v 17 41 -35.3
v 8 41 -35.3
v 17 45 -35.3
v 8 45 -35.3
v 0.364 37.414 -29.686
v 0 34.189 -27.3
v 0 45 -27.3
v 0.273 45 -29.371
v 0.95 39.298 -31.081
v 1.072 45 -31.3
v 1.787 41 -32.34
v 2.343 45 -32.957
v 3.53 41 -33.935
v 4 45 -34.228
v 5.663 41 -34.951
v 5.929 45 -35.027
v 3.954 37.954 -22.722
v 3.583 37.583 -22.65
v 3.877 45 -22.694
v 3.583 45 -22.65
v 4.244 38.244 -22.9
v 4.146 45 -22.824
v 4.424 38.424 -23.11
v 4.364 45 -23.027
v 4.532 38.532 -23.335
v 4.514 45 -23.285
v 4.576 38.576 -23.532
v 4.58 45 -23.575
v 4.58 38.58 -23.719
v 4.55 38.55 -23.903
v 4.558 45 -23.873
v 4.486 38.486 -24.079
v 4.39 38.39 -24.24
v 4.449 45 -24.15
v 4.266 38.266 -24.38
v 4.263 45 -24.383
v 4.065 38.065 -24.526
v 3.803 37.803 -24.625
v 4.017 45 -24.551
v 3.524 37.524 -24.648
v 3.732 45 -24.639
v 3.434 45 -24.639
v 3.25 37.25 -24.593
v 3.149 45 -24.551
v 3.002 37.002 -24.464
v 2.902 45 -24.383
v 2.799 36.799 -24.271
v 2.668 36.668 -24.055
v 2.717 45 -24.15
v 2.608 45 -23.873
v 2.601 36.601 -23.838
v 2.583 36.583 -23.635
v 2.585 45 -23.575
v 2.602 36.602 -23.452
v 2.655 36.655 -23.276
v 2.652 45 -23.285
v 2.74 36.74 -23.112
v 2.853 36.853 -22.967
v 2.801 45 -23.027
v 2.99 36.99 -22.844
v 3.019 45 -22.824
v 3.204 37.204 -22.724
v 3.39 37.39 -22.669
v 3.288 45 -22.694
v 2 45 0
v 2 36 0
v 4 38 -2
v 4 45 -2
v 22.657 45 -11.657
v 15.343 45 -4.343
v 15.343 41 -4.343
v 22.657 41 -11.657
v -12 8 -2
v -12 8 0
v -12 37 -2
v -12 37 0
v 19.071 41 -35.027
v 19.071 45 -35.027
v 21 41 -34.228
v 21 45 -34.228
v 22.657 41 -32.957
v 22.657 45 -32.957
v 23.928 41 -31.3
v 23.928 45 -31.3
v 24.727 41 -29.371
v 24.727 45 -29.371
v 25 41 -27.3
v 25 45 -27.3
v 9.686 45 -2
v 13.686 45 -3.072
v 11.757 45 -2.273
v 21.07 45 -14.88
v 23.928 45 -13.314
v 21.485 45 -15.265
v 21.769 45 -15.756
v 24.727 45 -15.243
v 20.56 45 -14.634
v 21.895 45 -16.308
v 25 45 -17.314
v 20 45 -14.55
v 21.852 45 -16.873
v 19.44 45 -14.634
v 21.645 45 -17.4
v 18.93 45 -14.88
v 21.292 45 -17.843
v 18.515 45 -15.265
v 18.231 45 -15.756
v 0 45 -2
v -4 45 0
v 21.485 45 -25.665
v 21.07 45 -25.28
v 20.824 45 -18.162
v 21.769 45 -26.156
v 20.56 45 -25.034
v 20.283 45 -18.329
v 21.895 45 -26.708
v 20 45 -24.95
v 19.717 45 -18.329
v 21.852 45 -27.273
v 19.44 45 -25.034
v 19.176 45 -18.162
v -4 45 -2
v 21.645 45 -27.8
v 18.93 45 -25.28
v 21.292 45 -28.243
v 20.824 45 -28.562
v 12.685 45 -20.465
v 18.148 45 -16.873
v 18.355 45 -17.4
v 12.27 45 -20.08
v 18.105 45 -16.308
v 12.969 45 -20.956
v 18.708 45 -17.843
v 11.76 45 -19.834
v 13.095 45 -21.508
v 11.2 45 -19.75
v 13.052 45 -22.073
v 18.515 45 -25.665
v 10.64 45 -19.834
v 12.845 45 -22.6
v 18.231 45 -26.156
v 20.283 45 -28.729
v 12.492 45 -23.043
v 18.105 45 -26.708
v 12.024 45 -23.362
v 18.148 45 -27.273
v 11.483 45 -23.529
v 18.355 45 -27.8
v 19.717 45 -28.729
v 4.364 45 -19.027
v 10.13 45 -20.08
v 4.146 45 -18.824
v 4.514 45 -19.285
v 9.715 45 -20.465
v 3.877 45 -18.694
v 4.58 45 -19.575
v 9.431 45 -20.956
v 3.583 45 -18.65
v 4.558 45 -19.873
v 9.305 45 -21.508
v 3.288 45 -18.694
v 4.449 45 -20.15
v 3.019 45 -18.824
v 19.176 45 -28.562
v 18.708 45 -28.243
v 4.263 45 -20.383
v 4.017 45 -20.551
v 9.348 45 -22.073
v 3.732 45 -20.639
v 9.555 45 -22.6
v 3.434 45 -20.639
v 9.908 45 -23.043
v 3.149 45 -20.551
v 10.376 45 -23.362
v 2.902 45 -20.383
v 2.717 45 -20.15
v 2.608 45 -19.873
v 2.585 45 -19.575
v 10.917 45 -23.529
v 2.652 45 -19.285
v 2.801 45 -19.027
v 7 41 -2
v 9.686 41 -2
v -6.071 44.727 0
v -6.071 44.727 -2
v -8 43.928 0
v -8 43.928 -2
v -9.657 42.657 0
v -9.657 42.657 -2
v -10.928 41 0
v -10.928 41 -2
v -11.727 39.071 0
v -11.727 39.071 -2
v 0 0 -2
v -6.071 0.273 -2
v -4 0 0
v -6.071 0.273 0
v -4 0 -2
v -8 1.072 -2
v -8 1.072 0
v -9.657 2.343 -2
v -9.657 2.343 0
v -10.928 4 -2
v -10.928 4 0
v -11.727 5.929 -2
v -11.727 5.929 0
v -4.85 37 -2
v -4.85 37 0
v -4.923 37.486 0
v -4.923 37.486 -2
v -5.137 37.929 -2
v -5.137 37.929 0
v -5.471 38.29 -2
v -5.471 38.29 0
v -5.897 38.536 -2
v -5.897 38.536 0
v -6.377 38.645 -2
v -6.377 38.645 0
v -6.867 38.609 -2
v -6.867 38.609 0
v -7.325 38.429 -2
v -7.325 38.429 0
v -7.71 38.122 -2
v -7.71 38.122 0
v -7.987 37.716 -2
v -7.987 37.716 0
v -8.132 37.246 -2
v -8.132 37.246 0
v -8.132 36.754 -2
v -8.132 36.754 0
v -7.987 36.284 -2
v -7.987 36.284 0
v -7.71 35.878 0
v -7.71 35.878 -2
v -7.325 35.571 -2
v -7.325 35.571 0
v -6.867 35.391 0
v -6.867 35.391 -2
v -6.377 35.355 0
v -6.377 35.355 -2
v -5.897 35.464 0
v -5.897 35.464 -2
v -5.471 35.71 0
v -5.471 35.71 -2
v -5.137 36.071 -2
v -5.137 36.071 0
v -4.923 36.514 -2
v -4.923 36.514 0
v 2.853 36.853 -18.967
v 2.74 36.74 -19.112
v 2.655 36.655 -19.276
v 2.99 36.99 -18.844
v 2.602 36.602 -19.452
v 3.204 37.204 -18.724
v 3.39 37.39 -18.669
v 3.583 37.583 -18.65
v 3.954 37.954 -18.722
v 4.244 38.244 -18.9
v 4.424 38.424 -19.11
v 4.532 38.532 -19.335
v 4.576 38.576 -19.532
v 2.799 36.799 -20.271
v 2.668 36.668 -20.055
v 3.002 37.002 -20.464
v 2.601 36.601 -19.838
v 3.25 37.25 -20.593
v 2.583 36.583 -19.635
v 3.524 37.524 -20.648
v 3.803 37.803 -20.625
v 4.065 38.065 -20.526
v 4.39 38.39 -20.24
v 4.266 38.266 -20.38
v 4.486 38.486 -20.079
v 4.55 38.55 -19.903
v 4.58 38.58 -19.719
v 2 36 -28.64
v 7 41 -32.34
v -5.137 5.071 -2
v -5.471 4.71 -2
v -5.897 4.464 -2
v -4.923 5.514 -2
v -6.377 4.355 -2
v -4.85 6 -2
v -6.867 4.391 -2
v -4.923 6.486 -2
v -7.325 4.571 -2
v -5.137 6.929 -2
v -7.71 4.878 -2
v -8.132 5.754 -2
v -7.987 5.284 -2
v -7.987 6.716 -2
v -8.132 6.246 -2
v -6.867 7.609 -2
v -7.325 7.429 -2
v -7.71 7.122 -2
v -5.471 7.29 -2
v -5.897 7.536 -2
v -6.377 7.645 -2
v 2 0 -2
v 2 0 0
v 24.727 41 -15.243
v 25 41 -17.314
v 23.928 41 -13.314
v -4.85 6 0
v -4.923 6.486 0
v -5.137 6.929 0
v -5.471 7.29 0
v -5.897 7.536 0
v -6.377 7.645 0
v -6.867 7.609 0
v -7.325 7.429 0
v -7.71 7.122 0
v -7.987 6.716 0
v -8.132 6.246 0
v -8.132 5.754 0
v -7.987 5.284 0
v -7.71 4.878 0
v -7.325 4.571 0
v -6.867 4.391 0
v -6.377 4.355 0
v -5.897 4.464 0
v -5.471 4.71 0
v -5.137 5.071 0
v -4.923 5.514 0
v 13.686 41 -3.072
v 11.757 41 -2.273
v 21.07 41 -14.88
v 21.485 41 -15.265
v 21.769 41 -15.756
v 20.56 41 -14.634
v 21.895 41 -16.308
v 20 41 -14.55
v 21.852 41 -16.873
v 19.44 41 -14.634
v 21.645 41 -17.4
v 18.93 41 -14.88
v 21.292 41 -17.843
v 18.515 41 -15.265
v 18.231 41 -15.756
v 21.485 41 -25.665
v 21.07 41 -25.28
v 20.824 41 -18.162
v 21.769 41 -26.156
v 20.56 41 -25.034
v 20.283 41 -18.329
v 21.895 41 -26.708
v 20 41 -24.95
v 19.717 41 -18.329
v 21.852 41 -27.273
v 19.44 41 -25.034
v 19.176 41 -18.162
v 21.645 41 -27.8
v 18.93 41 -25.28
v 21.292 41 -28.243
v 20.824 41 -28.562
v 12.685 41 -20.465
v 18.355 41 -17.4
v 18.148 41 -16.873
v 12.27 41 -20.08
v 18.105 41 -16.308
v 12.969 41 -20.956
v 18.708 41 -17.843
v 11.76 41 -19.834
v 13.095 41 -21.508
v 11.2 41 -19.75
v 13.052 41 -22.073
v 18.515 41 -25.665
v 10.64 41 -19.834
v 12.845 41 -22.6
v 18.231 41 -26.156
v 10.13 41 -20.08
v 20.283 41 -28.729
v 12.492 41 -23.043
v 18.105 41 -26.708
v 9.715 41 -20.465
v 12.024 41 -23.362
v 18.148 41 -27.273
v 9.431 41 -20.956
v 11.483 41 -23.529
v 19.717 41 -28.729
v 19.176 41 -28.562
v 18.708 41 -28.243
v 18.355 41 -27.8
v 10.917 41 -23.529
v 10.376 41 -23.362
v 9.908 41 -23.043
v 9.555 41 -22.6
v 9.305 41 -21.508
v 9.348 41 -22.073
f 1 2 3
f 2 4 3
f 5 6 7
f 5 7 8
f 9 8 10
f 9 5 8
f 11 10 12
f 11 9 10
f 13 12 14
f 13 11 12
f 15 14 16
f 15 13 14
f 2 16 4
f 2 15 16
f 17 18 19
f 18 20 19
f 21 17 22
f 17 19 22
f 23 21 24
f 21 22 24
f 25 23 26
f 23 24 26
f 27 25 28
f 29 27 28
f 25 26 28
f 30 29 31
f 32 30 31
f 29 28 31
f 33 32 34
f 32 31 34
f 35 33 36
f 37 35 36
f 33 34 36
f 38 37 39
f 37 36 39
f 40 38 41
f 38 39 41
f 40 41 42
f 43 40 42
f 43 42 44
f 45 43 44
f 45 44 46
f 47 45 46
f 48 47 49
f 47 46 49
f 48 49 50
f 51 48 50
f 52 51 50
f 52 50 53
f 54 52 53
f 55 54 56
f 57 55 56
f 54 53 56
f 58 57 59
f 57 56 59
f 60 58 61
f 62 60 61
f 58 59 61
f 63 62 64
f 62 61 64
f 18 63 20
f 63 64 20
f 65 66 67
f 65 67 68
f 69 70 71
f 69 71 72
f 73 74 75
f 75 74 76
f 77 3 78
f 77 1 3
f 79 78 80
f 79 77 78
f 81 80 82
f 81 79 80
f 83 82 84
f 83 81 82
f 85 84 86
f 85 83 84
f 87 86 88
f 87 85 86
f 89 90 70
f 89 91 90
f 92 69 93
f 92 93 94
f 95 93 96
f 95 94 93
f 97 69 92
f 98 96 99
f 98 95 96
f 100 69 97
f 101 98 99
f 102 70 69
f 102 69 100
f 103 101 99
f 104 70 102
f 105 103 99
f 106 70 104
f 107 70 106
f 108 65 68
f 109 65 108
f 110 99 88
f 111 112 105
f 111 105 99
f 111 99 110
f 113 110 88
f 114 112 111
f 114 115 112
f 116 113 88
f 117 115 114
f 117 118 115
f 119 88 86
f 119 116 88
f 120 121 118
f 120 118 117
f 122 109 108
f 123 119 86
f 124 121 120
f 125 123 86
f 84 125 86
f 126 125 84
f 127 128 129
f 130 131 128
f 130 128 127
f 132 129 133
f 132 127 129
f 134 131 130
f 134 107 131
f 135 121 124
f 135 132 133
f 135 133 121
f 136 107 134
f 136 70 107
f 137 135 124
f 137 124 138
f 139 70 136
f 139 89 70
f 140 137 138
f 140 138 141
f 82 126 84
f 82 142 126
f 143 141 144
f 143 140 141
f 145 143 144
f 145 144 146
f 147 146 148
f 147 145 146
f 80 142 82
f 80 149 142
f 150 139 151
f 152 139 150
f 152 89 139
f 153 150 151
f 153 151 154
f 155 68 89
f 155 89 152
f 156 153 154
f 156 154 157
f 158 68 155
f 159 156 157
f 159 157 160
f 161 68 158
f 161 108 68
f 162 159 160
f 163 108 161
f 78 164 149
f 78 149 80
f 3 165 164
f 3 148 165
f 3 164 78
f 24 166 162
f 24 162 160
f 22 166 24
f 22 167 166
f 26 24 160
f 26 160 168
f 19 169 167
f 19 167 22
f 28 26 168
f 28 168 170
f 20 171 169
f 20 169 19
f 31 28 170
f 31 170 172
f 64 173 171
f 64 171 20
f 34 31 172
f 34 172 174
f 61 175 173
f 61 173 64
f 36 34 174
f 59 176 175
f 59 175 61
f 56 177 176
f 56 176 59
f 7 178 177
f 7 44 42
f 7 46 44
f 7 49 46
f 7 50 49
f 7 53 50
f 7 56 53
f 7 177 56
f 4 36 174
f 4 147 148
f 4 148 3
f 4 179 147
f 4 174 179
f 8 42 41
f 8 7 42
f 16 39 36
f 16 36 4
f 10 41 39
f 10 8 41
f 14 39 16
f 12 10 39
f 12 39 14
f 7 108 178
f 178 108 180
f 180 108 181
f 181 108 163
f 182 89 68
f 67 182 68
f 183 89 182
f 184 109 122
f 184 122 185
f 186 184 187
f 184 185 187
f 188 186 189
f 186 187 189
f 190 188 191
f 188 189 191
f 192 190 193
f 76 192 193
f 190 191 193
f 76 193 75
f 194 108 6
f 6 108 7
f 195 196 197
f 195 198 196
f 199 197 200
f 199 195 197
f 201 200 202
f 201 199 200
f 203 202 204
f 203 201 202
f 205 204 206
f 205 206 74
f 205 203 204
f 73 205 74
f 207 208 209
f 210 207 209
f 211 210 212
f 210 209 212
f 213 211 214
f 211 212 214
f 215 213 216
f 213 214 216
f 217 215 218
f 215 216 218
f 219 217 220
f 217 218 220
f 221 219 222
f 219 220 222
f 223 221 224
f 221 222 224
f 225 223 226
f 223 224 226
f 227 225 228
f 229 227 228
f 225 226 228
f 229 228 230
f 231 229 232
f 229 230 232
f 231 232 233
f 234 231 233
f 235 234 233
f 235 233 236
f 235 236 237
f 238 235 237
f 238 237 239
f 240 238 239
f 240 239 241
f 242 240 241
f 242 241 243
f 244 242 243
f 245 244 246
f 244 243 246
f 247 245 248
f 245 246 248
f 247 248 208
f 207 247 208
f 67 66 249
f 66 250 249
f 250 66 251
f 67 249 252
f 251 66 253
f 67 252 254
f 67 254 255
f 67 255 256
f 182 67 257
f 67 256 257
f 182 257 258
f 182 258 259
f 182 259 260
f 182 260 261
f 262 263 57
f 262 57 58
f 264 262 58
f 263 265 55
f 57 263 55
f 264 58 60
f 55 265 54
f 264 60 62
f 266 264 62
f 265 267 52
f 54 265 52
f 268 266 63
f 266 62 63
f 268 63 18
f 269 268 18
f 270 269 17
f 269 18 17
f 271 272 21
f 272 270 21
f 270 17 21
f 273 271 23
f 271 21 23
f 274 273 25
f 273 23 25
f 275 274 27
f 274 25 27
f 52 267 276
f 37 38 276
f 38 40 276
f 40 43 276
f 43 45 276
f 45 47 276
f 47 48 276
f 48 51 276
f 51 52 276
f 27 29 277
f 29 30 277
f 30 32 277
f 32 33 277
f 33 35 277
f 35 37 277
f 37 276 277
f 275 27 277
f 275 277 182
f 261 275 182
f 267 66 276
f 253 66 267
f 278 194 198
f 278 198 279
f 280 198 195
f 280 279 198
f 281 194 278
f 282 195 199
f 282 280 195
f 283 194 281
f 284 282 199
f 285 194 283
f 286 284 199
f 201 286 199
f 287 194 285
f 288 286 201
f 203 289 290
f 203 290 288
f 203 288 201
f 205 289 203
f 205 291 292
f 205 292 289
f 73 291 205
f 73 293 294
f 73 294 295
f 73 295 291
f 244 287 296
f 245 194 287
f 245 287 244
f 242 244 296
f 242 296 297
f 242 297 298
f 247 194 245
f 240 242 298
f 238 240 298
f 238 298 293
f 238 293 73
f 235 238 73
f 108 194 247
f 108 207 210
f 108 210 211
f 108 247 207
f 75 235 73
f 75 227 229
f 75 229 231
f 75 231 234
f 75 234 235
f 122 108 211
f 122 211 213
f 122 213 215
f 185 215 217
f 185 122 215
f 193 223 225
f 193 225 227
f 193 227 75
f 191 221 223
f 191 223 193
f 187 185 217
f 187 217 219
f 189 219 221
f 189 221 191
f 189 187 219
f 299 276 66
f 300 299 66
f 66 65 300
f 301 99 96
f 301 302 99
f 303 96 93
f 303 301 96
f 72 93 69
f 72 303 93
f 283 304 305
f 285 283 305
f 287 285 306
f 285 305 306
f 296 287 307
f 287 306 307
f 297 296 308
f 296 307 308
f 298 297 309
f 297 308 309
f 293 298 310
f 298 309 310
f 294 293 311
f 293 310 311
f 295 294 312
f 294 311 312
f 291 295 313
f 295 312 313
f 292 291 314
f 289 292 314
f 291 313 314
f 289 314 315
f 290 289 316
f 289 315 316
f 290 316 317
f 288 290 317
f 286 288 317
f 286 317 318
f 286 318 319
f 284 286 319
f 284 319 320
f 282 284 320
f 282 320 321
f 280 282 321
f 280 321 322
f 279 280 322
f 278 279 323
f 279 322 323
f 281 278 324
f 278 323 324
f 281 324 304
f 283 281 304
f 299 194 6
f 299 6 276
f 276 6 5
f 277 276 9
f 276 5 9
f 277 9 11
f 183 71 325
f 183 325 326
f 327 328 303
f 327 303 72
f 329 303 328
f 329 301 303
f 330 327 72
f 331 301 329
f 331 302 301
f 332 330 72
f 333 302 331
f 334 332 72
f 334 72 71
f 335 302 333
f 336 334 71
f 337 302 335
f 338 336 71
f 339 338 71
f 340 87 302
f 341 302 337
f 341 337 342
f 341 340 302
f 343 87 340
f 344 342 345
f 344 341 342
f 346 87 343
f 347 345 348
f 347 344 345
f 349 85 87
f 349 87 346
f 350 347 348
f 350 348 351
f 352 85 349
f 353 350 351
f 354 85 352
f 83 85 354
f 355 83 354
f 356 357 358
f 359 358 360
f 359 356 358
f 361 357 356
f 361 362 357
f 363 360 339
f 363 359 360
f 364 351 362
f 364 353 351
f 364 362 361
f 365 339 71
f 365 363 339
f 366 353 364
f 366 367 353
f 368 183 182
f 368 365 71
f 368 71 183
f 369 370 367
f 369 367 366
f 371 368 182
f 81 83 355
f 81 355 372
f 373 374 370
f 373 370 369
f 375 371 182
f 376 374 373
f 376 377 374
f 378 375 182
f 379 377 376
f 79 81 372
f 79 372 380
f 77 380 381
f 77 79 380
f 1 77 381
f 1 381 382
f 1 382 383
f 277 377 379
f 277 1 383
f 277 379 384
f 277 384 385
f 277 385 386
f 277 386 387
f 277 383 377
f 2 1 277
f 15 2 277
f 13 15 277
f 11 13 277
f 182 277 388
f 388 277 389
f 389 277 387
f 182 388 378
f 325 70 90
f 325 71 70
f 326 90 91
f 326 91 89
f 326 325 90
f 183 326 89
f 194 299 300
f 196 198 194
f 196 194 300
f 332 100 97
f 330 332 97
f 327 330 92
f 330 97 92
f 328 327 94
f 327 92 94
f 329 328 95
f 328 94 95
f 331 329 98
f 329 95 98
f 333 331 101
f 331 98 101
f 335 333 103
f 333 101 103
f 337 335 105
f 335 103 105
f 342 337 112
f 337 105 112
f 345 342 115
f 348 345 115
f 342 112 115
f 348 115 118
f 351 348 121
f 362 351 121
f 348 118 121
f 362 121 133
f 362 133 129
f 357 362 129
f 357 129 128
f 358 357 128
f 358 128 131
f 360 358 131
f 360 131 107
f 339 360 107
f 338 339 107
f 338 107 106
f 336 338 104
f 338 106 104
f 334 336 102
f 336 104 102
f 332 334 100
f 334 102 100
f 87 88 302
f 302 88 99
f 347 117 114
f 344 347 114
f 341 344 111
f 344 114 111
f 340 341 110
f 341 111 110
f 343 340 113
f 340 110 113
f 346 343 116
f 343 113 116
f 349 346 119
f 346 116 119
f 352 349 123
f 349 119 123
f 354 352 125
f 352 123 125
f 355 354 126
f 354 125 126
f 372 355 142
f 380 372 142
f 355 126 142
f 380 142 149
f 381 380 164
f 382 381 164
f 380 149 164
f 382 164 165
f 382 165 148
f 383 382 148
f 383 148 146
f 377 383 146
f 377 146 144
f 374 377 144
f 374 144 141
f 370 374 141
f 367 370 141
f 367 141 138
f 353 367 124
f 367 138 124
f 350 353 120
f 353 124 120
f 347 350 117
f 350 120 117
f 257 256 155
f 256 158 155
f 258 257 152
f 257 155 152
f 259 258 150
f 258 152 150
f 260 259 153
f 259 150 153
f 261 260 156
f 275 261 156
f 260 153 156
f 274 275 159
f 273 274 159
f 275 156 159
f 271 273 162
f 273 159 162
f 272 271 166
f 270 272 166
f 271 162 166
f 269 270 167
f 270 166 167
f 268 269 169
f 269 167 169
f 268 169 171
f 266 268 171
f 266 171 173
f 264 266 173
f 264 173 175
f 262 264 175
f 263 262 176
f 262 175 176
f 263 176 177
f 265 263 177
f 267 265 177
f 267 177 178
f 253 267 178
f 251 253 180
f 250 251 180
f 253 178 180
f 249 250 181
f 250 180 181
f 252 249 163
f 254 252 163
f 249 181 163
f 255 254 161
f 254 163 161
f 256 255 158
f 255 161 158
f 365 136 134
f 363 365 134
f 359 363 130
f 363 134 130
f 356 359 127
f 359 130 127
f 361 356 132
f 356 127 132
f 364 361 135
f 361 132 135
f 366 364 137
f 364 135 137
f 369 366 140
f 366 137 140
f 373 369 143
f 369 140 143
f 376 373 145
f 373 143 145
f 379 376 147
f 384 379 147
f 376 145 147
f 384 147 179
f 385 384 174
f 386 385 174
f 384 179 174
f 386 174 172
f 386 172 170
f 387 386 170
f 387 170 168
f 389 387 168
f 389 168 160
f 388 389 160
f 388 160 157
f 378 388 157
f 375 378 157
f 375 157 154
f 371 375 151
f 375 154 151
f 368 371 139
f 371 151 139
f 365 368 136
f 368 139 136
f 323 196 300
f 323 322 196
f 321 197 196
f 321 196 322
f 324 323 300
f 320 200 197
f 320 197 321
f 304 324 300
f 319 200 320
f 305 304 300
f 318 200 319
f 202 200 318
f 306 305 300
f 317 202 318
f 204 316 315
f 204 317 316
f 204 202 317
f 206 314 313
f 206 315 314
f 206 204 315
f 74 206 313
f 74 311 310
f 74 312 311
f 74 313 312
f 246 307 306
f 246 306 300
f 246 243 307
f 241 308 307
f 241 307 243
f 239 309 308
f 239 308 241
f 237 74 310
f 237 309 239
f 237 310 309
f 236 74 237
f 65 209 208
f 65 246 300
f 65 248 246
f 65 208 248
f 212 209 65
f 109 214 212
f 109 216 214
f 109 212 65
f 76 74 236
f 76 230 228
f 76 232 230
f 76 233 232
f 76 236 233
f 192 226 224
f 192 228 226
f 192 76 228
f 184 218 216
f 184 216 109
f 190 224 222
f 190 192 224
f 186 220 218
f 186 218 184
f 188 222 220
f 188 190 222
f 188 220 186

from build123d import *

# Parameters (mm, degrees)
SKETCH1_R           = 1.6500000000000001
SKETCH1_R_2         = 1.6500000000000006
BOSS_EXTRUDE1_DEPTH = 2
BOSS_EXTRUDE2_DEPTH = 2
BOSS_EXTRUDE3_DEPTH = 4
SKETCH4_R           = 1.8999999999999948
SKETCH4_R_2         = 1.8999999999999981
CUT_EXTRUDE1_DEPTH  = 4
SKETCH5_R           = 1.0000000000000009
SKETCH5_R_2         = 1
SKETCH5_R_3         = 1.8999999999999981
CUT_EXTRUDE2_DEPTH  = 63.418667079648536
CUT_EXTRUDE3_DEPTH  = 4
CHAMFER1_SIZE       = 5
CHAMFER2_SIZE       = 2
FILLET1_R           = 8
FILLET2_R           = 8
FILLET3_R           = 8


# Some blends are built 0.0001 mm under size
with BuildPart() as part:
    # Sketch1 → Boss-Extrude1 (new body)
    with BuildSketch(Plane.XY):
        Polygon((0, 0), (-12, -1.47e-15), (-12, 45), (0, 45), align=None)
        with Locations((-6.499999999999999, 37)):
            Circle(SKETCH1_R, mode=Mode.SUBTRACT)
        with Locations((-6.5000000000000036, 5.999999999999999)):
            Circle(SKETCH1_R_2, mode=Mode.SUBTRACT)
    extrude(amount=-BOSS_EXTRUDE1_DEPTH)

    # Sketch2 → Boss-Extrude2 (add)
    with BuildSketch(Plane(origin=(0, 0, 0), x_dir=(0, 0, -1), z_dir=(1, 0, 0))):
        Polygon((35.3, 45), (2, 0), (5.51e-15, 0), (0, 45), align=None)
    extrude(amount=BOSS_EXTRUDE2_DEPTH)

    # Sketch3 → Boss-Extrude3 (add)
    with BuildSketch(Plane(origin=(0, 45, 0), x_dir=(1, 0, 0), z_dir=(0, 1, 0))):
        Polygon((-6.1e-16, 35.3), (25, 35.3), (25.000000000000004, 1.9999999999999991), (3.47e-15, 1.9999999999999991), align=None)
    extrude(amount=-BOSS_EXTRUDE3_DEPTH)

    # Sketch4 → Cut-Extrude1 (cut)
    with BuildSketch(Plane(origin=(0, 45, 0), x_dir=(1, 0, 0), z_dir=(0, 1, 0))):
        with Locations(Location((20.000000000000004, 26.850000000000005, 0), (0, 0, 270))):
            Circle(SKETCH4_R)
        with Locations(Location((20.00000000000001, 16.45, 0), (0, 0, 270))):
            Circle(SKETCH4_R)
        with Locations(Location((11.200000000000008, 21.650000000000002, 0), (0, 0, 270))):
            Circle(SKETCH4_R_2)
    extrude(amount=-CUT_EXTRUDE1_DEPTH, mode=Mode.SUBTRACT)

    # Sketch5 → Cut-Extrude2 (cut, through all)
    with BuildSketch(Plane(origin=(0, 45, 0), x_dir=(1, 0, 0), z_dir=(0, 1, 0))):
        with Locations(Location((3.5826389249908894, 23.65, 0), (0, 0, 270))):
            Circle(SKETCH5_R)
        with Locations(Location((3.5826389249908894, 19.650000000000002, 0), (0, 0, 270))):
            Circle(SKETCH5_R_2)
        with Locations(Location((11.200000000000008, 21.650000000000002, 0), (0, 0, 270))):
            Circle(SKETCH5_R_3)
    extrude(amount=-CUT_EXTRUDE2_DEPTH, mode=Mode.SUBTRACT)

    # Sketch6 → Cut-Extrude3 (cut)
    with BuildSketch(Plane(origin=(0, 45, 0), x_dir=(1, 0, 0), z_dir=(0, 1, 0))):
        Polygon((13.000000000000005, 1.9999999999999991), (25.000000000000004, 13.999999999999877), (25.000000000000004, 1.9999999999999991), align=None)
    extrude(amount=-CUT_EXTRUDE3_DEPTH, mode=Mode.SUBTRACT)

    # Chamfer1
    # the kernel refuses this chamfer: 5 mm, written as the material it adds along each edge
    with BuildSketch(Plane(origin=(2, 41, -45.19841493982955), x_dir=(-0.02749587661058636, -0.9996219169112968, 0), z_dir=(0, 0, 1))) as chamfer1_piece_1_section:
        Polygon((CHAMFER1_SIZE * 0.999621916911, CHAMFER1_SIZE * 0.0274958766106), (-CHAMFER1_SIZE * 0.0274958766106, CHAMFER1_SIZE * 0.999621916911), (0, 0), align=None)
    chamfer1_piece_1 = extrude(amount=43.19841493982955, mode=Mode.PRIVATE)
    chamfer1_piece_1 = split(chamfer1_piece_1, bisect_by=Plane(origin=(3.679771833975431, 32.284665683470884, -25.89065260576845), z_dir=(0, 0.5948430054102947, 0.8038418992031009)), keep=Keep.TOP, mode=Mode.PRIVATE)
    chamfer1_piece_1 = chamfer1_piece_1 - Plane(origin=(3.5826389249908894, 39.396771086693036, -19.650000000000002), x_dir=(-1.8e-16, 0, 1), z_dir=(0, 1, 0)) * Cylinder(1, 107, mode=Mode.PRIVATE)
    chamfer1_piece_1 = chamfer1_piece_1 - Plane(origin=(3.5826389249908894, 39.396771086693036, -23.65), x_dir=(-1.8e-16, 0, 1), z_dir=(0, 1, 0)) * Cylinder(1.0000000000000009, 107, mode=Mode.PRIVATE)
    add(chamfer1_piece_1)

    # Chamfer2
    chamfer2_edges = [part.edges().sort_by_distance(p)[0] for p in [
        (1.9999999999990004, 40.50000000000074, -1.9999999999999996),
    ]]
    chamfer(chamfer2_edges, length=CHAMFER2_SIZE - 0.0001)  # a hair under: the kernel refuses the full size

    # Fillet1
    fillet1_edges = [part.edges().sort_by_distance(p)[0] for p in [
        (-12, -1.47e-15, -1),
        (-12, 45, -1),
    ]]
    fillet(fillet1_edges, radius=FILLET1_R)

    # Fillet2
    fillet2_edges = [part.edges().sort_by_distance(p)[0] for p in [
        (-6.1e-16, 43, -35.3),
        (25, 43, -35.3),
    ]]
    fillet(fillet2_edges, radius=FILLET2_R)

    # Fillet3
    fillet3_edges = [part.edges().sort_by_distance(p)[0] for p in [
        (13.000000000000005, 43, -1.9999999999999991),
        (25.000000000000004, 43, -13.999999999999877),
    ]]
    fillet(fillet3_edges, radius=FILLET3_R)


solid = part.part
